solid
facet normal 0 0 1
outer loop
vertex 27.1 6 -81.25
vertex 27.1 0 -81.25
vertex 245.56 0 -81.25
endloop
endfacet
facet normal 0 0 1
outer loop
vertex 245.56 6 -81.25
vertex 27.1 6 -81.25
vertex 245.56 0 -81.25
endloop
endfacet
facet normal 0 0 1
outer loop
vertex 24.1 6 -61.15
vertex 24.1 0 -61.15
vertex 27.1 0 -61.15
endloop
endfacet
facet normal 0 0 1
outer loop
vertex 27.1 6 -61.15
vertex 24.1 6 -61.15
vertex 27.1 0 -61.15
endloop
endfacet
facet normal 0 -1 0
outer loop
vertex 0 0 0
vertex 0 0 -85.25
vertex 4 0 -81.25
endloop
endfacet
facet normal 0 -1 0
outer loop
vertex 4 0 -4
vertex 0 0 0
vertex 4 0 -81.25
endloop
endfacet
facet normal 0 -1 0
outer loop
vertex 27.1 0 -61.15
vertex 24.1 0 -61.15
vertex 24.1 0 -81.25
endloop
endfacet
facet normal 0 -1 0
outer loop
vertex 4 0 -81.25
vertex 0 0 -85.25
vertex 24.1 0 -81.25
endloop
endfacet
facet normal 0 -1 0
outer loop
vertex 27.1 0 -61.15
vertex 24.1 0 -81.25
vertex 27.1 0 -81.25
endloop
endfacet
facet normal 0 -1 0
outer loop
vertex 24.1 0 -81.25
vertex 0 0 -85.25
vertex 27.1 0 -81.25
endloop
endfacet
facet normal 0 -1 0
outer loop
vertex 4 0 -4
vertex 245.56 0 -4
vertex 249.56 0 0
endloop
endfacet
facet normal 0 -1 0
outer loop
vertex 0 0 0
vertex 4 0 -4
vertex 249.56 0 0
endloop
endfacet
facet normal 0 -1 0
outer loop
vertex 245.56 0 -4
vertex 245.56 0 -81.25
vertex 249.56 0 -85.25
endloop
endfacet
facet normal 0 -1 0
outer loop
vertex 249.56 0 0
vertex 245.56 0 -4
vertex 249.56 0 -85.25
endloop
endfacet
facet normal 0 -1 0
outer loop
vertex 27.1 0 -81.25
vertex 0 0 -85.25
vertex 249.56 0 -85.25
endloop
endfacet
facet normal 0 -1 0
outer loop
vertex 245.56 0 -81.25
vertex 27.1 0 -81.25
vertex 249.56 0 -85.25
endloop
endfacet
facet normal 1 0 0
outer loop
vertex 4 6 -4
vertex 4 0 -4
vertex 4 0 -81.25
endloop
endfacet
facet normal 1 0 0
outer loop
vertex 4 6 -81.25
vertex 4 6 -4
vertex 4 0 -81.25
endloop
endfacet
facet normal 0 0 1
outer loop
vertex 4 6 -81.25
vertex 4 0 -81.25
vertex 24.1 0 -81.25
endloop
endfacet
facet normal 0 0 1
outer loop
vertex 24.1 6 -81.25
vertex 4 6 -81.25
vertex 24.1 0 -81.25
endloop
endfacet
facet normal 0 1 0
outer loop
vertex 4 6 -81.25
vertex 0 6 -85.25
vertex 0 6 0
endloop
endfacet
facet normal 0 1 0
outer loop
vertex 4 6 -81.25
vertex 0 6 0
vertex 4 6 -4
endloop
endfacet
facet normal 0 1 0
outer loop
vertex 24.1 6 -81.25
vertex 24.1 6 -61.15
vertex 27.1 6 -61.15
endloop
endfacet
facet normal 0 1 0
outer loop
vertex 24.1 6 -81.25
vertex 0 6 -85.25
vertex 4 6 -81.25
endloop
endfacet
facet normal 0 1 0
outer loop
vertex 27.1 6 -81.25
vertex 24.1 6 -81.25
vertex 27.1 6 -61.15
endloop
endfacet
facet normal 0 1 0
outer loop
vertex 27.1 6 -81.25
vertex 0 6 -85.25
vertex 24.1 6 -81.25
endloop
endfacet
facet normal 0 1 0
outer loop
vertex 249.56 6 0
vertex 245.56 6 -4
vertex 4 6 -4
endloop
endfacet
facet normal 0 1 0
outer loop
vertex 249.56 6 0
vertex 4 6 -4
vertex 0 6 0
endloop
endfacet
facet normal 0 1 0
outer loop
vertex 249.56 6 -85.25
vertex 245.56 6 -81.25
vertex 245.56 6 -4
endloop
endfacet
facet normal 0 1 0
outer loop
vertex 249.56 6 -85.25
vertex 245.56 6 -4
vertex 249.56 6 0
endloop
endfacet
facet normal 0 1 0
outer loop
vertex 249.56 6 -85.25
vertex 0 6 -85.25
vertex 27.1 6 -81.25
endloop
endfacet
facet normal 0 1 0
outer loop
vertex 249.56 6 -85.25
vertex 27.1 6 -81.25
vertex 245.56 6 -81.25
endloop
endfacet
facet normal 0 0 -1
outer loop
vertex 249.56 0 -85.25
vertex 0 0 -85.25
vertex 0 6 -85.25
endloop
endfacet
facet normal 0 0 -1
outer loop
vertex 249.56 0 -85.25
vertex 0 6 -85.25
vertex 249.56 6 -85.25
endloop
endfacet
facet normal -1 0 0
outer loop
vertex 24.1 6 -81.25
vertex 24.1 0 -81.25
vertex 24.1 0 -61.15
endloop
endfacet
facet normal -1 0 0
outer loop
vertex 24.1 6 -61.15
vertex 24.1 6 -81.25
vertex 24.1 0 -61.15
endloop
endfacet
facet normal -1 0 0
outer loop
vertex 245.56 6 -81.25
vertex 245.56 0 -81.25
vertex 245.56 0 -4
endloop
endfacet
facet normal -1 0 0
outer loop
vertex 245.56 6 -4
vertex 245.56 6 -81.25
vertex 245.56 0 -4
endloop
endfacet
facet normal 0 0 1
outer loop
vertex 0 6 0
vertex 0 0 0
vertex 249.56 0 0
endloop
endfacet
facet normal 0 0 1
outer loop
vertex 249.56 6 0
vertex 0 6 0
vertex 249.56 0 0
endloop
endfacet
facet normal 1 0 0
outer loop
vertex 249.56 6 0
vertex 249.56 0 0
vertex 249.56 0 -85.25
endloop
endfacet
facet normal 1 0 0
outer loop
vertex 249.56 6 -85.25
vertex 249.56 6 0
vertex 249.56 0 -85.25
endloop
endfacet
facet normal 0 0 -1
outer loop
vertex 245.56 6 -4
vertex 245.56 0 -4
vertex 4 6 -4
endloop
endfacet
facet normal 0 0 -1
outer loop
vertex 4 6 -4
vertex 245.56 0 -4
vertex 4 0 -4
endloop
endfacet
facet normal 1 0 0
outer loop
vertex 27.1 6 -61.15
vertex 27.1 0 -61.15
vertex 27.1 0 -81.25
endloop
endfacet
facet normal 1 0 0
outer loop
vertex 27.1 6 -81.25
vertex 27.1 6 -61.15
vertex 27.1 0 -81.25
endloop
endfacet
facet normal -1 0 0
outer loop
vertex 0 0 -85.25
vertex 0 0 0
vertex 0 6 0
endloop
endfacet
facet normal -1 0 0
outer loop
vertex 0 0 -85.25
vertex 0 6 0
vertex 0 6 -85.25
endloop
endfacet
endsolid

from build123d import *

# Parameters (mm, degrees)
ESQUISSE1_W        = 249.56
ESQUISSE1_H        = 85.25
BOSS_EXTRU_1_DEPTH = 6


with BuildPart() as part:
    # Esquisse1 → Boss.-Extru.1 (new body)
    with BuildSketch(Plane(origin=(0, 0, 0), x_dir=(1, 0, 0), z_dir=(0, 1, 0))):
        with Locations((124.78, 42.625)):
            Rectangle(ESQUISSE1_W, ESQUISSE1_H)
        Polygon((27.1, 81.25), (245.56, 81.25), (245.56, 4), (4, 4), (4, 81.25), (24.1, 81.25), (24.1, 61.15), (27.1, 61.15), align=None, mode=Mode.SUBTRACT)
    extrude(amount=BOSS_EXTRU_1_DEPTH)


solid = part.part
